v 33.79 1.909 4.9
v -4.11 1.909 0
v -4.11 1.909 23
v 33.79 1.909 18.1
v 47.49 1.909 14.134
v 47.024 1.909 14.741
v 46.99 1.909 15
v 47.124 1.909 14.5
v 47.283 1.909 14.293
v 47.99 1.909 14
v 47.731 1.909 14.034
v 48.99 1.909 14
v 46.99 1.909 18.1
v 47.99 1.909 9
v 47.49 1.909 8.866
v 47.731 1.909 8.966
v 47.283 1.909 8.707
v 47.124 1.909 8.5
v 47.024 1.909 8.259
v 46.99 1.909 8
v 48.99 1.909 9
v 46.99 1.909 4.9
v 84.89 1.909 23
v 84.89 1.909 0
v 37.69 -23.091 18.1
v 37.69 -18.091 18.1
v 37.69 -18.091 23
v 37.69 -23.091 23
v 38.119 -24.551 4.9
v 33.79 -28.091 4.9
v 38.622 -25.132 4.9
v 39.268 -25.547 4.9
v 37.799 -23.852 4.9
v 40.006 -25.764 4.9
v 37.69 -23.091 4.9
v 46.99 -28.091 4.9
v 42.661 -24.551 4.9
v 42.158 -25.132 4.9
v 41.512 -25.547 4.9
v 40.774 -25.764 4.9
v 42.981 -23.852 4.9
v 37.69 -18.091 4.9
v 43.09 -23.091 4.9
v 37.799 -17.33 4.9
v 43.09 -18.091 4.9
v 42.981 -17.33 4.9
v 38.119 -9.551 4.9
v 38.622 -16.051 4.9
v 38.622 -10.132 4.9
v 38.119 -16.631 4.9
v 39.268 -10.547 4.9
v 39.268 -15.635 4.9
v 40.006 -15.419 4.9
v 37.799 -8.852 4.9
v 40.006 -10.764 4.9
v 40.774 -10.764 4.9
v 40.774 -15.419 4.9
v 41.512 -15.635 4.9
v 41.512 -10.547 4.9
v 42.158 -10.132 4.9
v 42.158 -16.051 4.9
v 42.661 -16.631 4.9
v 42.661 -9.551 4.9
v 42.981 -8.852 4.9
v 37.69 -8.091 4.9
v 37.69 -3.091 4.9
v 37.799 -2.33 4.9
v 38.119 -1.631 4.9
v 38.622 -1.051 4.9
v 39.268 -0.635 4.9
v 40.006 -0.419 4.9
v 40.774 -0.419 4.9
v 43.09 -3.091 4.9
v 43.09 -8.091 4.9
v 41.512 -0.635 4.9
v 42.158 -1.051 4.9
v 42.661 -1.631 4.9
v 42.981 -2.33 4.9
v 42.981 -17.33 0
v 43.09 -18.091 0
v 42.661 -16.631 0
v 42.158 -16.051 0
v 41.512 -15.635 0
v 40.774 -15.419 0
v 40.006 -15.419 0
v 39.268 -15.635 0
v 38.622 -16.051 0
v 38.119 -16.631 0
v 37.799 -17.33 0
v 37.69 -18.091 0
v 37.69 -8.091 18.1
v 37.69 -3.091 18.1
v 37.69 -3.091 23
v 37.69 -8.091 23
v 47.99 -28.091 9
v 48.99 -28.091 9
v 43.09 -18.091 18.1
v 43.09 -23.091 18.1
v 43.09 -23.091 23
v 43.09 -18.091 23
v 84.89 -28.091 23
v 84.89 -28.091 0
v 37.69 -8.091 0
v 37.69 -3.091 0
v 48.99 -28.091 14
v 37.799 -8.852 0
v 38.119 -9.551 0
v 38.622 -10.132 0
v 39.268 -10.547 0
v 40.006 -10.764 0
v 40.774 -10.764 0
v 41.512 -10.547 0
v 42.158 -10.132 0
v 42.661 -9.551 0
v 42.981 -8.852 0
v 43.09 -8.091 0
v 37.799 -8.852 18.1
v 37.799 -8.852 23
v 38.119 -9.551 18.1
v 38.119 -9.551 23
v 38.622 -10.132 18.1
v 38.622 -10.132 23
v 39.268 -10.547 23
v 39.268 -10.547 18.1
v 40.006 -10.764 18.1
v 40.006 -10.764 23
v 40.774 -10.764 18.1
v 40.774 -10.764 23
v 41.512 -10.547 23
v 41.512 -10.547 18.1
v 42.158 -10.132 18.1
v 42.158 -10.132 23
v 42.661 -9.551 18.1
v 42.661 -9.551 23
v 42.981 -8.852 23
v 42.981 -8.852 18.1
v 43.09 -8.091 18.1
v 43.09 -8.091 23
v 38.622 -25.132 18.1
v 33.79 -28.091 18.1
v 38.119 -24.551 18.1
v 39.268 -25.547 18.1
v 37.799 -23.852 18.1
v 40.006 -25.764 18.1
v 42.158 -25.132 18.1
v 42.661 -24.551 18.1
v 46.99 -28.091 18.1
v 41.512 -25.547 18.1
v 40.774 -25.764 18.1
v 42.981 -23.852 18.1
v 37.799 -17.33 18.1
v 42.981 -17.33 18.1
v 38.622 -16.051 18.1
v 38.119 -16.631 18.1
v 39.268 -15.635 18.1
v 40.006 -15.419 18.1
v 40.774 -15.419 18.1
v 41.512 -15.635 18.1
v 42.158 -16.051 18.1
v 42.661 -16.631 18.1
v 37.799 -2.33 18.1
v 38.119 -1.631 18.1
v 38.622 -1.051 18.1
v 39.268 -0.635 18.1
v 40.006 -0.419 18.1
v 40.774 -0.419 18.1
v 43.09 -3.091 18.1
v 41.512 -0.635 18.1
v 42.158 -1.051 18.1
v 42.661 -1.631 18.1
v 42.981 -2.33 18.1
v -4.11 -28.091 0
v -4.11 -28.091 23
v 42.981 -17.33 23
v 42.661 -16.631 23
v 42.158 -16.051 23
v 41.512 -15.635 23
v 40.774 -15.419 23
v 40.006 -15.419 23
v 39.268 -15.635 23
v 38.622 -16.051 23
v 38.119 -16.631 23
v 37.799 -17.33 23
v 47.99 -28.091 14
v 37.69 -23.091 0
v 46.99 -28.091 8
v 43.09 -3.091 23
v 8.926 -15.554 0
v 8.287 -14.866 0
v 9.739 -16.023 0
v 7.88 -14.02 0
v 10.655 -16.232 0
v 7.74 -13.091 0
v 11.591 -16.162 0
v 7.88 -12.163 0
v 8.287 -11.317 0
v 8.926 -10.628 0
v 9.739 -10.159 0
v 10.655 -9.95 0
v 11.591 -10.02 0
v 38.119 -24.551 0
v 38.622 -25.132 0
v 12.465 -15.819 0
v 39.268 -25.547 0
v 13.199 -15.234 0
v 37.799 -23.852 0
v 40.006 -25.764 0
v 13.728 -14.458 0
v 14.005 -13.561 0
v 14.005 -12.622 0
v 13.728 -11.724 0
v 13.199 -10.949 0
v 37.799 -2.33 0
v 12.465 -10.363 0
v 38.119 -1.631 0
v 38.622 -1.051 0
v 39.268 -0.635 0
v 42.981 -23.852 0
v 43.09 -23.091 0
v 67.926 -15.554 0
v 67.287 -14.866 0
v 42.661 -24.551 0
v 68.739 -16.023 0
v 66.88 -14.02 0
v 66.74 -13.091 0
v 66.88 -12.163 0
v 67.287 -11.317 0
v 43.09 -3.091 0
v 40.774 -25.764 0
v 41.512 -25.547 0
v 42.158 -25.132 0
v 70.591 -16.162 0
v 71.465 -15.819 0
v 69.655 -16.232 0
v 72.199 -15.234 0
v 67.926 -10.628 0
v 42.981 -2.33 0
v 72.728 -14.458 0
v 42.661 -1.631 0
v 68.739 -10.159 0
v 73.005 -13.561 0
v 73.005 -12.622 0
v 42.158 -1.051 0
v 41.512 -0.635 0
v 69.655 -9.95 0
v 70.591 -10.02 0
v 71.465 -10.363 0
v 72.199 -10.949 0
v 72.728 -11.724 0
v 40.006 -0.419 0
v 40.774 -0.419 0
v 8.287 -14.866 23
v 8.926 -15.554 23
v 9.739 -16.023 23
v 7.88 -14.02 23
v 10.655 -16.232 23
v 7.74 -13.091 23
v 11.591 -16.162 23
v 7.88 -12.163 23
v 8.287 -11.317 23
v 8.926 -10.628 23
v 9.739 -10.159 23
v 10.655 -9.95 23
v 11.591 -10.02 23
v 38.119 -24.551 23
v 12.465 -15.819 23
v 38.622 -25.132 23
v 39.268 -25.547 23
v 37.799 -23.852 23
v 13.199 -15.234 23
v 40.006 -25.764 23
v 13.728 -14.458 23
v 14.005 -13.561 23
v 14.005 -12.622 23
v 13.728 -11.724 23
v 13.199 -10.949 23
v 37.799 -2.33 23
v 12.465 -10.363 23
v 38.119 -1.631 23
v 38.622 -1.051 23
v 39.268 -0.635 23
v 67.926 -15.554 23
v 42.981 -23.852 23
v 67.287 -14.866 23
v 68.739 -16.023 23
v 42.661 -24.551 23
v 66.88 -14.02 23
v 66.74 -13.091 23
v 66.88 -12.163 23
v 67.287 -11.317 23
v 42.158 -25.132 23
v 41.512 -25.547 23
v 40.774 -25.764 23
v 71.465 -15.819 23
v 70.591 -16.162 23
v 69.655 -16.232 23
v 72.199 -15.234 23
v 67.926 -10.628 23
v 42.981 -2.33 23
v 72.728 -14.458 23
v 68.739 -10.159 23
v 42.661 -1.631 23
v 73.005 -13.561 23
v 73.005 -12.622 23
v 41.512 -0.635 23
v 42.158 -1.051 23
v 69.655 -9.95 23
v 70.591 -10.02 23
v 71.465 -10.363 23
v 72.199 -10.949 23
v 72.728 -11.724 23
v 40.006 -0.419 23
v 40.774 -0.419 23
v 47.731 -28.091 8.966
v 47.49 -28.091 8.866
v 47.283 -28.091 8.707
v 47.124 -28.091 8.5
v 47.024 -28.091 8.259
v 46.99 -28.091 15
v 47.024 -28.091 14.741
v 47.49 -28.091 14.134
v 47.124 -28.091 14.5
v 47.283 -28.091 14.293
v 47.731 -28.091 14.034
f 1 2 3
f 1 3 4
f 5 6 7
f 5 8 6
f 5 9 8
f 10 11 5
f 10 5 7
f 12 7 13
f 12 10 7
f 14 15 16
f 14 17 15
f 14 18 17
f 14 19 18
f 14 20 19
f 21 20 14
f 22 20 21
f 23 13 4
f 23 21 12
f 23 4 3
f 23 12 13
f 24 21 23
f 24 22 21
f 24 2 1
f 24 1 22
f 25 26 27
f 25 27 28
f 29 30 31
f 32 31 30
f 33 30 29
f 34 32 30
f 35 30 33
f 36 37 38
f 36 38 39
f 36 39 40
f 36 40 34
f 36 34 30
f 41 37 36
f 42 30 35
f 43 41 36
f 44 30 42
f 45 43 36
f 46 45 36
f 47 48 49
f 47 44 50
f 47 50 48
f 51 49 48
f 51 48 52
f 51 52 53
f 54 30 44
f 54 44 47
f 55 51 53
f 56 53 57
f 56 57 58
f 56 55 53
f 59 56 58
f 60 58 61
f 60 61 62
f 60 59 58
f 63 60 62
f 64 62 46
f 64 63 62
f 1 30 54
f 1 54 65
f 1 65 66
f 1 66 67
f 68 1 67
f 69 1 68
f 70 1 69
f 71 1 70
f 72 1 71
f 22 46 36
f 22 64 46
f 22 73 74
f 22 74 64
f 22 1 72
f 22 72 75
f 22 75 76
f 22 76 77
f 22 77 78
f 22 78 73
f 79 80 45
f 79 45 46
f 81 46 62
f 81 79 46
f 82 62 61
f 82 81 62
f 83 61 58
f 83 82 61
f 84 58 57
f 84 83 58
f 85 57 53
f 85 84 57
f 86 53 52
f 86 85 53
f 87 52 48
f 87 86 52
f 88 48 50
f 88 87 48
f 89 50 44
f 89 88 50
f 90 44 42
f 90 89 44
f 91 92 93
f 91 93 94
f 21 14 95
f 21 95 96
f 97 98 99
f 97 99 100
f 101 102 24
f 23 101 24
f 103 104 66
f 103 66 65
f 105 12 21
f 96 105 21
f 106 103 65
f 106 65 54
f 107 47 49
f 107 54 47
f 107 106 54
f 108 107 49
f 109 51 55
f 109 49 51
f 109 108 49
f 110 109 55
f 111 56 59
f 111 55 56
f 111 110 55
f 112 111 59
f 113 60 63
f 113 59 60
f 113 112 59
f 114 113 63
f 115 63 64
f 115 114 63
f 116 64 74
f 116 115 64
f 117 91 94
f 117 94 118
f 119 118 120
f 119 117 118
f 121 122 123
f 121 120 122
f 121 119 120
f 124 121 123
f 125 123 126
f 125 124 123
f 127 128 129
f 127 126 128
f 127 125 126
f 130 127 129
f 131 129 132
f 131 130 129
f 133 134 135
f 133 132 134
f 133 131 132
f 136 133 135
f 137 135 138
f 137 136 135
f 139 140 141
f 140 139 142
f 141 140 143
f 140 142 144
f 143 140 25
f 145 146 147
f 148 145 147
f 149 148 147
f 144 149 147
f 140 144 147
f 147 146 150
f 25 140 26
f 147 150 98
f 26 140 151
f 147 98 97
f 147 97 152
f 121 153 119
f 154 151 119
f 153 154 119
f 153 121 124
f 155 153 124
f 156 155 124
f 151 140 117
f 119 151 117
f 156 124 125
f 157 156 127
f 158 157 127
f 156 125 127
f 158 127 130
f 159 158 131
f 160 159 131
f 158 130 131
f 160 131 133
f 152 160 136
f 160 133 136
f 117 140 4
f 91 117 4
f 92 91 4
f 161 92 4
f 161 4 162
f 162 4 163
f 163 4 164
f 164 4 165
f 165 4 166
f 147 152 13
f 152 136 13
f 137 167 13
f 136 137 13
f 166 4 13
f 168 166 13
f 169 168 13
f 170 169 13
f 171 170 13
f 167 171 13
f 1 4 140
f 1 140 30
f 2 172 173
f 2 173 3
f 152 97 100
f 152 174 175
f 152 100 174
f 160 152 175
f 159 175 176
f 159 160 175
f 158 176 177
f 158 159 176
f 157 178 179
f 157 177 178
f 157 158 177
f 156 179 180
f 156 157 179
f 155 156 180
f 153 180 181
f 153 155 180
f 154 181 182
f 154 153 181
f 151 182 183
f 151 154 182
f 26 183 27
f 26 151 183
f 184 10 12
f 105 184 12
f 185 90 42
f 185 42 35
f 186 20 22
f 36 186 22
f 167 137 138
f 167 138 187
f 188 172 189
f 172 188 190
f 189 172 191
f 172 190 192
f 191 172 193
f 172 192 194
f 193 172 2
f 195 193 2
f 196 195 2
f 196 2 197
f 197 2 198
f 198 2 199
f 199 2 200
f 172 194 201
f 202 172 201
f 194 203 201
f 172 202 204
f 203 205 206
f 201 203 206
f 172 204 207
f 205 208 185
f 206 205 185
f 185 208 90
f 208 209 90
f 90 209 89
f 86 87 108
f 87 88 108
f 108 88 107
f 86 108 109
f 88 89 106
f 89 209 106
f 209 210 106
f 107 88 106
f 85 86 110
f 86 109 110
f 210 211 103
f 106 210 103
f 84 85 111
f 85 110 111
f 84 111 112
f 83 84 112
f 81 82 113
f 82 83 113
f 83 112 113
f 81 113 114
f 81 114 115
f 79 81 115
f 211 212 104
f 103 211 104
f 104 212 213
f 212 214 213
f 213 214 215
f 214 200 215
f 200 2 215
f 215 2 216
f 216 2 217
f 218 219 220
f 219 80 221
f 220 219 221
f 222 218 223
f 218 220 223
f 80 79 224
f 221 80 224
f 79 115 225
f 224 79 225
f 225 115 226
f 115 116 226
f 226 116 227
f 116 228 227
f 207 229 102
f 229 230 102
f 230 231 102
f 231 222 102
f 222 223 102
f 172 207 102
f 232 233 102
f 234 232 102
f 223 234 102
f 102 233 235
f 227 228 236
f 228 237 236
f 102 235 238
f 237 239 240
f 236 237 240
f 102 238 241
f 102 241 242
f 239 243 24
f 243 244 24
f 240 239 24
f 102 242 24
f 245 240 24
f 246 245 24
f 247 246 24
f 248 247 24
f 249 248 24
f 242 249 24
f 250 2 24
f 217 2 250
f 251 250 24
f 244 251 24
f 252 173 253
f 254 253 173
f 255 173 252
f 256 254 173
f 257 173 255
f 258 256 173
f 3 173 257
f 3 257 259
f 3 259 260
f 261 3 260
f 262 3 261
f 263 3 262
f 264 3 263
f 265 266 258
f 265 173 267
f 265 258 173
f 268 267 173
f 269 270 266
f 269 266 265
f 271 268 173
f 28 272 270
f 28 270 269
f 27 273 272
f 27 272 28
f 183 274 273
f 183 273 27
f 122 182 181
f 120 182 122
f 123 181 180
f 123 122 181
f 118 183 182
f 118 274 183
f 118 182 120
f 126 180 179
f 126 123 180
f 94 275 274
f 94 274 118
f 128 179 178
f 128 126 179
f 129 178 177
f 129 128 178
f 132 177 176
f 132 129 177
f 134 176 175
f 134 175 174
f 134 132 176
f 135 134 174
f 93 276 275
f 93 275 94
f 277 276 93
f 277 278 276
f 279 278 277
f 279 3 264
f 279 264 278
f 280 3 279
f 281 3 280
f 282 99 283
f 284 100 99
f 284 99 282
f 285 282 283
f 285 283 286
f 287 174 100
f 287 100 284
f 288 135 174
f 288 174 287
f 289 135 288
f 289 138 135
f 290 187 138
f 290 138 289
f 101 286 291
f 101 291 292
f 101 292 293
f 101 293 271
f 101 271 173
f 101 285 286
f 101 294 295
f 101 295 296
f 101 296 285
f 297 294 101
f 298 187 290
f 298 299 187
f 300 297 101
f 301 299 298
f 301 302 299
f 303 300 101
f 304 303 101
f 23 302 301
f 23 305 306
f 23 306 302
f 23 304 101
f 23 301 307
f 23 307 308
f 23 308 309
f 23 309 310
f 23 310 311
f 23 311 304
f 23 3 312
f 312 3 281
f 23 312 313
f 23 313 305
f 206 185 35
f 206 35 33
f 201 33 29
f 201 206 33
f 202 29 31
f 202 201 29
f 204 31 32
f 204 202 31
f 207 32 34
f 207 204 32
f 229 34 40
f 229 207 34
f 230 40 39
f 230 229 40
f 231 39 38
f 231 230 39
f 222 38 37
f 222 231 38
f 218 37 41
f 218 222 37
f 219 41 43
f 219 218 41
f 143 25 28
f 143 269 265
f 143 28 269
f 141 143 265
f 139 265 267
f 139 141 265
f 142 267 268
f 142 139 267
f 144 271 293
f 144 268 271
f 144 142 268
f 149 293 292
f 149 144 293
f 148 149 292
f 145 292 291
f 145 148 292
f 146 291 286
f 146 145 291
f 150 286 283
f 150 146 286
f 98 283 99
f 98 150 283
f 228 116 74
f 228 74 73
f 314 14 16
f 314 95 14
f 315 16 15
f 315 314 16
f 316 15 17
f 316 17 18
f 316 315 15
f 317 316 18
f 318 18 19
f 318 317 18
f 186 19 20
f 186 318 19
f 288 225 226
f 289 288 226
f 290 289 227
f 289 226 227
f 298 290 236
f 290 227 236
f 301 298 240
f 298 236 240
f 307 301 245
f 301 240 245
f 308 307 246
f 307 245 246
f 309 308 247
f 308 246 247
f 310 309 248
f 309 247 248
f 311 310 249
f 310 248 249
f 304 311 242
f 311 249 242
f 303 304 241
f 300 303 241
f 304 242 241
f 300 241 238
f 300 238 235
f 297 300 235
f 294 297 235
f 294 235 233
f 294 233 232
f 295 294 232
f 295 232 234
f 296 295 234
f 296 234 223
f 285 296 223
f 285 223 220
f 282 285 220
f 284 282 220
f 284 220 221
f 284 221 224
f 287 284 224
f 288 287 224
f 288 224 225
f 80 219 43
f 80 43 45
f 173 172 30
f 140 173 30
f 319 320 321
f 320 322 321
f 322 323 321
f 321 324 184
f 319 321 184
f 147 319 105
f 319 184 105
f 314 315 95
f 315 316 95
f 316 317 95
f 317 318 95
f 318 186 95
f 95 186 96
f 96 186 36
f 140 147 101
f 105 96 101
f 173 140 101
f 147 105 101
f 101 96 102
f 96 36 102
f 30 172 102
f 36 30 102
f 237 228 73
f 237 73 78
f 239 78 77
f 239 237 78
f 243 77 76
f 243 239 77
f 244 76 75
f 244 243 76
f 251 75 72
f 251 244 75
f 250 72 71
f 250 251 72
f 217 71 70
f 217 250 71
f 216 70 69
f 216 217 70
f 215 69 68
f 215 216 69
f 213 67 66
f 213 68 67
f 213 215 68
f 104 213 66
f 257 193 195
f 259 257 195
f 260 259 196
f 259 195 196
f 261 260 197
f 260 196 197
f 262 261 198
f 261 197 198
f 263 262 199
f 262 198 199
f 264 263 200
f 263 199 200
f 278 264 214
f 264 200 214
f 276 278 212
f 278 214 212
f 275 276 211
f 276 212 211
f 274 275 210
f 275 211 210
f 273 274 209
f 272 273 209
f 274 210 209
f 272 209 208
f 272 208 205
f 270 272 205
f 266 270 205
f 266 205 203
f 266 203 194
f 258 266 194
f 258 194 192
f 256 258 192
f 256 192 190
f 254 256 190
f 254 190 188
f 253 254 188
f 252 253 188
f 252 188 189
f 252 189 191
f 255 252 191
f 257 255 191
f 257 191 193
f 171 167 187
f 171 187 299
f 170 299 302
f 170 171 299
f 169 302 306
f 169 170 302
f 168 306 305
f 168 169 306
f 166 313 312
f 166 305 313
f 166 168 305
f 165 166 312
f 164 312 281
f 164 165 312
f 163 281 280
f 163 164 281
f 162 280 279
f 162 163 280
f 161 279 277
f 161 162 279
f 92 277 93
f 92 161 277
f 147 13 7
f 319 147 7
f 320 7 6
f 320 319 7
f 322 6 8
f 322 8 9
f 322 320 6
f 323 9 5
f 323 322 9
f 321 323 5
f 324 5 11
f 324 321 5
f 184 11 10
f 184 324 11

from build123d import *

# Parameters (mm, degrees)
ESQUISSE1_W             = 89
ESQUISSE1_H             = 30
BOSS_EXTRU_1_DEPTH      = 23
ESQUISSE2_W             = 13.2
ESQUISSE2_H             = 13.2
ESQUISSE2_W_2           = 2
ESQUISSE2_H_2           = 5
ENL_V_MAT_EXTRU_1_DEPTH = 31
ESQUISSE3_R             = 3.15
ENL_V_MAT_EXTRU_2_DEPTH = 24
ENL_V_MAT_EXTRU_3_DEPTH = 24
CONG_1_R                = 1


with BuildPart() as part:
    # Esquisse1 → Boss.-Extru.1 (new body)
    with BuildSketch(Plane.XY):
        with Locations((40.389968792, -13.091136671)):
            Rectangle(ESQUISSE1_W, ESQUISSE1_H)
    extrude(amount=BOSS_EXTRU_1_DEPTH)

    # Esquisse2 → Enlèv. mat.-Extru.1 (cut, through all)
    with BuildSketch(Plane(origin=(0, 1.908863329, 0), x_dir=(1, 0, 0), z_dir=(0, 1, 0))):
        with Locations((40.389968792, -11.5)):
            Rectangle(ESQUISSE2_W, ESQUISSE2_H)
        with Locations((47.989968792, -11.5)):
            Rectangle(ESQUISSE2_W_2, ESQUISSE2_H_2)
    extrude(amount=-ENL_V_MAT_EXTRU_1_DEPTH, mode=Mode.SUBTRACT)

    # Esquisse3 → Enlèv. mat.-Extru.2 (cut, through all)
    with BuildSketch(Plane(origin=(0, 0, 0), x_dir=(-1, 0, 0), z_dir=(0, 0, -1))):
        with Locations((-10.889968792, -13.091136671)):
            Circle(ESQUISSE3_R)
        with Locations((-69.889968792, -13.091136671)):
            Circle(ESQUISSE3_R)
    extrude(amount=-ENL_V_MAT_EXTRU_2_DEPTH, mode=Mode.SUBTRACT)

    # Esquisse4 → Enlèv. mat.-Extru.3 (cut, through all)
    with BuildSketch(Plane(origin=(0, 0, 0), x_dir=(-1, 0, 0), z_dir=(0, 0, -1))):
        with BuildLine():
            ThreePointArc((-37.689968792, -8.091136671), (-40.389968792, -10.791136671), (-43.089968792, -8.091136671))
            Line((-43.089968792, -8.091136671), (-43.089968792, -3.091136671))
            ThreePointArc((-43.089968792, -3.091136671), (-40.389968792, -0.391136671), (-37.689968792, -3.091136671))
            Line((-37.689968792, -3.091136671), (-37.689968792, -8.091136671))
        make_face()
        with BuildLine():
            Line((-43.089968792, -23.091136671), (-43.089968792, -18.091136671))
            ThreePointArc((-43.089968792, -18.091136671), (-40.389968792, -15.391136671), (-37.689968792, -18.091136671))
            Line((-37.689968792, -18.091136671), (-37.689968792, -23.091136671))
            ThreePointArc((-37.689968792, -23.091136671), (-40.389968792, -25.791136671), (-43.089968792, -23.091136671))
        make_face()
    extrude(amount=-ENL_V_MAT_EXTRU_3_DEPTH, mode=Mode.SUBTRACT)

    # Congé1
    cong_1_edges = [part.edges().sort_by_distance(p)[0] for p in [
        (46.989968792, -13.091136671, 9),
        (46.989968792, -13.091136671, 14),
    ]]
    fillet(cong_1_edges, radius=CONG_1_R)


solid = part.part
